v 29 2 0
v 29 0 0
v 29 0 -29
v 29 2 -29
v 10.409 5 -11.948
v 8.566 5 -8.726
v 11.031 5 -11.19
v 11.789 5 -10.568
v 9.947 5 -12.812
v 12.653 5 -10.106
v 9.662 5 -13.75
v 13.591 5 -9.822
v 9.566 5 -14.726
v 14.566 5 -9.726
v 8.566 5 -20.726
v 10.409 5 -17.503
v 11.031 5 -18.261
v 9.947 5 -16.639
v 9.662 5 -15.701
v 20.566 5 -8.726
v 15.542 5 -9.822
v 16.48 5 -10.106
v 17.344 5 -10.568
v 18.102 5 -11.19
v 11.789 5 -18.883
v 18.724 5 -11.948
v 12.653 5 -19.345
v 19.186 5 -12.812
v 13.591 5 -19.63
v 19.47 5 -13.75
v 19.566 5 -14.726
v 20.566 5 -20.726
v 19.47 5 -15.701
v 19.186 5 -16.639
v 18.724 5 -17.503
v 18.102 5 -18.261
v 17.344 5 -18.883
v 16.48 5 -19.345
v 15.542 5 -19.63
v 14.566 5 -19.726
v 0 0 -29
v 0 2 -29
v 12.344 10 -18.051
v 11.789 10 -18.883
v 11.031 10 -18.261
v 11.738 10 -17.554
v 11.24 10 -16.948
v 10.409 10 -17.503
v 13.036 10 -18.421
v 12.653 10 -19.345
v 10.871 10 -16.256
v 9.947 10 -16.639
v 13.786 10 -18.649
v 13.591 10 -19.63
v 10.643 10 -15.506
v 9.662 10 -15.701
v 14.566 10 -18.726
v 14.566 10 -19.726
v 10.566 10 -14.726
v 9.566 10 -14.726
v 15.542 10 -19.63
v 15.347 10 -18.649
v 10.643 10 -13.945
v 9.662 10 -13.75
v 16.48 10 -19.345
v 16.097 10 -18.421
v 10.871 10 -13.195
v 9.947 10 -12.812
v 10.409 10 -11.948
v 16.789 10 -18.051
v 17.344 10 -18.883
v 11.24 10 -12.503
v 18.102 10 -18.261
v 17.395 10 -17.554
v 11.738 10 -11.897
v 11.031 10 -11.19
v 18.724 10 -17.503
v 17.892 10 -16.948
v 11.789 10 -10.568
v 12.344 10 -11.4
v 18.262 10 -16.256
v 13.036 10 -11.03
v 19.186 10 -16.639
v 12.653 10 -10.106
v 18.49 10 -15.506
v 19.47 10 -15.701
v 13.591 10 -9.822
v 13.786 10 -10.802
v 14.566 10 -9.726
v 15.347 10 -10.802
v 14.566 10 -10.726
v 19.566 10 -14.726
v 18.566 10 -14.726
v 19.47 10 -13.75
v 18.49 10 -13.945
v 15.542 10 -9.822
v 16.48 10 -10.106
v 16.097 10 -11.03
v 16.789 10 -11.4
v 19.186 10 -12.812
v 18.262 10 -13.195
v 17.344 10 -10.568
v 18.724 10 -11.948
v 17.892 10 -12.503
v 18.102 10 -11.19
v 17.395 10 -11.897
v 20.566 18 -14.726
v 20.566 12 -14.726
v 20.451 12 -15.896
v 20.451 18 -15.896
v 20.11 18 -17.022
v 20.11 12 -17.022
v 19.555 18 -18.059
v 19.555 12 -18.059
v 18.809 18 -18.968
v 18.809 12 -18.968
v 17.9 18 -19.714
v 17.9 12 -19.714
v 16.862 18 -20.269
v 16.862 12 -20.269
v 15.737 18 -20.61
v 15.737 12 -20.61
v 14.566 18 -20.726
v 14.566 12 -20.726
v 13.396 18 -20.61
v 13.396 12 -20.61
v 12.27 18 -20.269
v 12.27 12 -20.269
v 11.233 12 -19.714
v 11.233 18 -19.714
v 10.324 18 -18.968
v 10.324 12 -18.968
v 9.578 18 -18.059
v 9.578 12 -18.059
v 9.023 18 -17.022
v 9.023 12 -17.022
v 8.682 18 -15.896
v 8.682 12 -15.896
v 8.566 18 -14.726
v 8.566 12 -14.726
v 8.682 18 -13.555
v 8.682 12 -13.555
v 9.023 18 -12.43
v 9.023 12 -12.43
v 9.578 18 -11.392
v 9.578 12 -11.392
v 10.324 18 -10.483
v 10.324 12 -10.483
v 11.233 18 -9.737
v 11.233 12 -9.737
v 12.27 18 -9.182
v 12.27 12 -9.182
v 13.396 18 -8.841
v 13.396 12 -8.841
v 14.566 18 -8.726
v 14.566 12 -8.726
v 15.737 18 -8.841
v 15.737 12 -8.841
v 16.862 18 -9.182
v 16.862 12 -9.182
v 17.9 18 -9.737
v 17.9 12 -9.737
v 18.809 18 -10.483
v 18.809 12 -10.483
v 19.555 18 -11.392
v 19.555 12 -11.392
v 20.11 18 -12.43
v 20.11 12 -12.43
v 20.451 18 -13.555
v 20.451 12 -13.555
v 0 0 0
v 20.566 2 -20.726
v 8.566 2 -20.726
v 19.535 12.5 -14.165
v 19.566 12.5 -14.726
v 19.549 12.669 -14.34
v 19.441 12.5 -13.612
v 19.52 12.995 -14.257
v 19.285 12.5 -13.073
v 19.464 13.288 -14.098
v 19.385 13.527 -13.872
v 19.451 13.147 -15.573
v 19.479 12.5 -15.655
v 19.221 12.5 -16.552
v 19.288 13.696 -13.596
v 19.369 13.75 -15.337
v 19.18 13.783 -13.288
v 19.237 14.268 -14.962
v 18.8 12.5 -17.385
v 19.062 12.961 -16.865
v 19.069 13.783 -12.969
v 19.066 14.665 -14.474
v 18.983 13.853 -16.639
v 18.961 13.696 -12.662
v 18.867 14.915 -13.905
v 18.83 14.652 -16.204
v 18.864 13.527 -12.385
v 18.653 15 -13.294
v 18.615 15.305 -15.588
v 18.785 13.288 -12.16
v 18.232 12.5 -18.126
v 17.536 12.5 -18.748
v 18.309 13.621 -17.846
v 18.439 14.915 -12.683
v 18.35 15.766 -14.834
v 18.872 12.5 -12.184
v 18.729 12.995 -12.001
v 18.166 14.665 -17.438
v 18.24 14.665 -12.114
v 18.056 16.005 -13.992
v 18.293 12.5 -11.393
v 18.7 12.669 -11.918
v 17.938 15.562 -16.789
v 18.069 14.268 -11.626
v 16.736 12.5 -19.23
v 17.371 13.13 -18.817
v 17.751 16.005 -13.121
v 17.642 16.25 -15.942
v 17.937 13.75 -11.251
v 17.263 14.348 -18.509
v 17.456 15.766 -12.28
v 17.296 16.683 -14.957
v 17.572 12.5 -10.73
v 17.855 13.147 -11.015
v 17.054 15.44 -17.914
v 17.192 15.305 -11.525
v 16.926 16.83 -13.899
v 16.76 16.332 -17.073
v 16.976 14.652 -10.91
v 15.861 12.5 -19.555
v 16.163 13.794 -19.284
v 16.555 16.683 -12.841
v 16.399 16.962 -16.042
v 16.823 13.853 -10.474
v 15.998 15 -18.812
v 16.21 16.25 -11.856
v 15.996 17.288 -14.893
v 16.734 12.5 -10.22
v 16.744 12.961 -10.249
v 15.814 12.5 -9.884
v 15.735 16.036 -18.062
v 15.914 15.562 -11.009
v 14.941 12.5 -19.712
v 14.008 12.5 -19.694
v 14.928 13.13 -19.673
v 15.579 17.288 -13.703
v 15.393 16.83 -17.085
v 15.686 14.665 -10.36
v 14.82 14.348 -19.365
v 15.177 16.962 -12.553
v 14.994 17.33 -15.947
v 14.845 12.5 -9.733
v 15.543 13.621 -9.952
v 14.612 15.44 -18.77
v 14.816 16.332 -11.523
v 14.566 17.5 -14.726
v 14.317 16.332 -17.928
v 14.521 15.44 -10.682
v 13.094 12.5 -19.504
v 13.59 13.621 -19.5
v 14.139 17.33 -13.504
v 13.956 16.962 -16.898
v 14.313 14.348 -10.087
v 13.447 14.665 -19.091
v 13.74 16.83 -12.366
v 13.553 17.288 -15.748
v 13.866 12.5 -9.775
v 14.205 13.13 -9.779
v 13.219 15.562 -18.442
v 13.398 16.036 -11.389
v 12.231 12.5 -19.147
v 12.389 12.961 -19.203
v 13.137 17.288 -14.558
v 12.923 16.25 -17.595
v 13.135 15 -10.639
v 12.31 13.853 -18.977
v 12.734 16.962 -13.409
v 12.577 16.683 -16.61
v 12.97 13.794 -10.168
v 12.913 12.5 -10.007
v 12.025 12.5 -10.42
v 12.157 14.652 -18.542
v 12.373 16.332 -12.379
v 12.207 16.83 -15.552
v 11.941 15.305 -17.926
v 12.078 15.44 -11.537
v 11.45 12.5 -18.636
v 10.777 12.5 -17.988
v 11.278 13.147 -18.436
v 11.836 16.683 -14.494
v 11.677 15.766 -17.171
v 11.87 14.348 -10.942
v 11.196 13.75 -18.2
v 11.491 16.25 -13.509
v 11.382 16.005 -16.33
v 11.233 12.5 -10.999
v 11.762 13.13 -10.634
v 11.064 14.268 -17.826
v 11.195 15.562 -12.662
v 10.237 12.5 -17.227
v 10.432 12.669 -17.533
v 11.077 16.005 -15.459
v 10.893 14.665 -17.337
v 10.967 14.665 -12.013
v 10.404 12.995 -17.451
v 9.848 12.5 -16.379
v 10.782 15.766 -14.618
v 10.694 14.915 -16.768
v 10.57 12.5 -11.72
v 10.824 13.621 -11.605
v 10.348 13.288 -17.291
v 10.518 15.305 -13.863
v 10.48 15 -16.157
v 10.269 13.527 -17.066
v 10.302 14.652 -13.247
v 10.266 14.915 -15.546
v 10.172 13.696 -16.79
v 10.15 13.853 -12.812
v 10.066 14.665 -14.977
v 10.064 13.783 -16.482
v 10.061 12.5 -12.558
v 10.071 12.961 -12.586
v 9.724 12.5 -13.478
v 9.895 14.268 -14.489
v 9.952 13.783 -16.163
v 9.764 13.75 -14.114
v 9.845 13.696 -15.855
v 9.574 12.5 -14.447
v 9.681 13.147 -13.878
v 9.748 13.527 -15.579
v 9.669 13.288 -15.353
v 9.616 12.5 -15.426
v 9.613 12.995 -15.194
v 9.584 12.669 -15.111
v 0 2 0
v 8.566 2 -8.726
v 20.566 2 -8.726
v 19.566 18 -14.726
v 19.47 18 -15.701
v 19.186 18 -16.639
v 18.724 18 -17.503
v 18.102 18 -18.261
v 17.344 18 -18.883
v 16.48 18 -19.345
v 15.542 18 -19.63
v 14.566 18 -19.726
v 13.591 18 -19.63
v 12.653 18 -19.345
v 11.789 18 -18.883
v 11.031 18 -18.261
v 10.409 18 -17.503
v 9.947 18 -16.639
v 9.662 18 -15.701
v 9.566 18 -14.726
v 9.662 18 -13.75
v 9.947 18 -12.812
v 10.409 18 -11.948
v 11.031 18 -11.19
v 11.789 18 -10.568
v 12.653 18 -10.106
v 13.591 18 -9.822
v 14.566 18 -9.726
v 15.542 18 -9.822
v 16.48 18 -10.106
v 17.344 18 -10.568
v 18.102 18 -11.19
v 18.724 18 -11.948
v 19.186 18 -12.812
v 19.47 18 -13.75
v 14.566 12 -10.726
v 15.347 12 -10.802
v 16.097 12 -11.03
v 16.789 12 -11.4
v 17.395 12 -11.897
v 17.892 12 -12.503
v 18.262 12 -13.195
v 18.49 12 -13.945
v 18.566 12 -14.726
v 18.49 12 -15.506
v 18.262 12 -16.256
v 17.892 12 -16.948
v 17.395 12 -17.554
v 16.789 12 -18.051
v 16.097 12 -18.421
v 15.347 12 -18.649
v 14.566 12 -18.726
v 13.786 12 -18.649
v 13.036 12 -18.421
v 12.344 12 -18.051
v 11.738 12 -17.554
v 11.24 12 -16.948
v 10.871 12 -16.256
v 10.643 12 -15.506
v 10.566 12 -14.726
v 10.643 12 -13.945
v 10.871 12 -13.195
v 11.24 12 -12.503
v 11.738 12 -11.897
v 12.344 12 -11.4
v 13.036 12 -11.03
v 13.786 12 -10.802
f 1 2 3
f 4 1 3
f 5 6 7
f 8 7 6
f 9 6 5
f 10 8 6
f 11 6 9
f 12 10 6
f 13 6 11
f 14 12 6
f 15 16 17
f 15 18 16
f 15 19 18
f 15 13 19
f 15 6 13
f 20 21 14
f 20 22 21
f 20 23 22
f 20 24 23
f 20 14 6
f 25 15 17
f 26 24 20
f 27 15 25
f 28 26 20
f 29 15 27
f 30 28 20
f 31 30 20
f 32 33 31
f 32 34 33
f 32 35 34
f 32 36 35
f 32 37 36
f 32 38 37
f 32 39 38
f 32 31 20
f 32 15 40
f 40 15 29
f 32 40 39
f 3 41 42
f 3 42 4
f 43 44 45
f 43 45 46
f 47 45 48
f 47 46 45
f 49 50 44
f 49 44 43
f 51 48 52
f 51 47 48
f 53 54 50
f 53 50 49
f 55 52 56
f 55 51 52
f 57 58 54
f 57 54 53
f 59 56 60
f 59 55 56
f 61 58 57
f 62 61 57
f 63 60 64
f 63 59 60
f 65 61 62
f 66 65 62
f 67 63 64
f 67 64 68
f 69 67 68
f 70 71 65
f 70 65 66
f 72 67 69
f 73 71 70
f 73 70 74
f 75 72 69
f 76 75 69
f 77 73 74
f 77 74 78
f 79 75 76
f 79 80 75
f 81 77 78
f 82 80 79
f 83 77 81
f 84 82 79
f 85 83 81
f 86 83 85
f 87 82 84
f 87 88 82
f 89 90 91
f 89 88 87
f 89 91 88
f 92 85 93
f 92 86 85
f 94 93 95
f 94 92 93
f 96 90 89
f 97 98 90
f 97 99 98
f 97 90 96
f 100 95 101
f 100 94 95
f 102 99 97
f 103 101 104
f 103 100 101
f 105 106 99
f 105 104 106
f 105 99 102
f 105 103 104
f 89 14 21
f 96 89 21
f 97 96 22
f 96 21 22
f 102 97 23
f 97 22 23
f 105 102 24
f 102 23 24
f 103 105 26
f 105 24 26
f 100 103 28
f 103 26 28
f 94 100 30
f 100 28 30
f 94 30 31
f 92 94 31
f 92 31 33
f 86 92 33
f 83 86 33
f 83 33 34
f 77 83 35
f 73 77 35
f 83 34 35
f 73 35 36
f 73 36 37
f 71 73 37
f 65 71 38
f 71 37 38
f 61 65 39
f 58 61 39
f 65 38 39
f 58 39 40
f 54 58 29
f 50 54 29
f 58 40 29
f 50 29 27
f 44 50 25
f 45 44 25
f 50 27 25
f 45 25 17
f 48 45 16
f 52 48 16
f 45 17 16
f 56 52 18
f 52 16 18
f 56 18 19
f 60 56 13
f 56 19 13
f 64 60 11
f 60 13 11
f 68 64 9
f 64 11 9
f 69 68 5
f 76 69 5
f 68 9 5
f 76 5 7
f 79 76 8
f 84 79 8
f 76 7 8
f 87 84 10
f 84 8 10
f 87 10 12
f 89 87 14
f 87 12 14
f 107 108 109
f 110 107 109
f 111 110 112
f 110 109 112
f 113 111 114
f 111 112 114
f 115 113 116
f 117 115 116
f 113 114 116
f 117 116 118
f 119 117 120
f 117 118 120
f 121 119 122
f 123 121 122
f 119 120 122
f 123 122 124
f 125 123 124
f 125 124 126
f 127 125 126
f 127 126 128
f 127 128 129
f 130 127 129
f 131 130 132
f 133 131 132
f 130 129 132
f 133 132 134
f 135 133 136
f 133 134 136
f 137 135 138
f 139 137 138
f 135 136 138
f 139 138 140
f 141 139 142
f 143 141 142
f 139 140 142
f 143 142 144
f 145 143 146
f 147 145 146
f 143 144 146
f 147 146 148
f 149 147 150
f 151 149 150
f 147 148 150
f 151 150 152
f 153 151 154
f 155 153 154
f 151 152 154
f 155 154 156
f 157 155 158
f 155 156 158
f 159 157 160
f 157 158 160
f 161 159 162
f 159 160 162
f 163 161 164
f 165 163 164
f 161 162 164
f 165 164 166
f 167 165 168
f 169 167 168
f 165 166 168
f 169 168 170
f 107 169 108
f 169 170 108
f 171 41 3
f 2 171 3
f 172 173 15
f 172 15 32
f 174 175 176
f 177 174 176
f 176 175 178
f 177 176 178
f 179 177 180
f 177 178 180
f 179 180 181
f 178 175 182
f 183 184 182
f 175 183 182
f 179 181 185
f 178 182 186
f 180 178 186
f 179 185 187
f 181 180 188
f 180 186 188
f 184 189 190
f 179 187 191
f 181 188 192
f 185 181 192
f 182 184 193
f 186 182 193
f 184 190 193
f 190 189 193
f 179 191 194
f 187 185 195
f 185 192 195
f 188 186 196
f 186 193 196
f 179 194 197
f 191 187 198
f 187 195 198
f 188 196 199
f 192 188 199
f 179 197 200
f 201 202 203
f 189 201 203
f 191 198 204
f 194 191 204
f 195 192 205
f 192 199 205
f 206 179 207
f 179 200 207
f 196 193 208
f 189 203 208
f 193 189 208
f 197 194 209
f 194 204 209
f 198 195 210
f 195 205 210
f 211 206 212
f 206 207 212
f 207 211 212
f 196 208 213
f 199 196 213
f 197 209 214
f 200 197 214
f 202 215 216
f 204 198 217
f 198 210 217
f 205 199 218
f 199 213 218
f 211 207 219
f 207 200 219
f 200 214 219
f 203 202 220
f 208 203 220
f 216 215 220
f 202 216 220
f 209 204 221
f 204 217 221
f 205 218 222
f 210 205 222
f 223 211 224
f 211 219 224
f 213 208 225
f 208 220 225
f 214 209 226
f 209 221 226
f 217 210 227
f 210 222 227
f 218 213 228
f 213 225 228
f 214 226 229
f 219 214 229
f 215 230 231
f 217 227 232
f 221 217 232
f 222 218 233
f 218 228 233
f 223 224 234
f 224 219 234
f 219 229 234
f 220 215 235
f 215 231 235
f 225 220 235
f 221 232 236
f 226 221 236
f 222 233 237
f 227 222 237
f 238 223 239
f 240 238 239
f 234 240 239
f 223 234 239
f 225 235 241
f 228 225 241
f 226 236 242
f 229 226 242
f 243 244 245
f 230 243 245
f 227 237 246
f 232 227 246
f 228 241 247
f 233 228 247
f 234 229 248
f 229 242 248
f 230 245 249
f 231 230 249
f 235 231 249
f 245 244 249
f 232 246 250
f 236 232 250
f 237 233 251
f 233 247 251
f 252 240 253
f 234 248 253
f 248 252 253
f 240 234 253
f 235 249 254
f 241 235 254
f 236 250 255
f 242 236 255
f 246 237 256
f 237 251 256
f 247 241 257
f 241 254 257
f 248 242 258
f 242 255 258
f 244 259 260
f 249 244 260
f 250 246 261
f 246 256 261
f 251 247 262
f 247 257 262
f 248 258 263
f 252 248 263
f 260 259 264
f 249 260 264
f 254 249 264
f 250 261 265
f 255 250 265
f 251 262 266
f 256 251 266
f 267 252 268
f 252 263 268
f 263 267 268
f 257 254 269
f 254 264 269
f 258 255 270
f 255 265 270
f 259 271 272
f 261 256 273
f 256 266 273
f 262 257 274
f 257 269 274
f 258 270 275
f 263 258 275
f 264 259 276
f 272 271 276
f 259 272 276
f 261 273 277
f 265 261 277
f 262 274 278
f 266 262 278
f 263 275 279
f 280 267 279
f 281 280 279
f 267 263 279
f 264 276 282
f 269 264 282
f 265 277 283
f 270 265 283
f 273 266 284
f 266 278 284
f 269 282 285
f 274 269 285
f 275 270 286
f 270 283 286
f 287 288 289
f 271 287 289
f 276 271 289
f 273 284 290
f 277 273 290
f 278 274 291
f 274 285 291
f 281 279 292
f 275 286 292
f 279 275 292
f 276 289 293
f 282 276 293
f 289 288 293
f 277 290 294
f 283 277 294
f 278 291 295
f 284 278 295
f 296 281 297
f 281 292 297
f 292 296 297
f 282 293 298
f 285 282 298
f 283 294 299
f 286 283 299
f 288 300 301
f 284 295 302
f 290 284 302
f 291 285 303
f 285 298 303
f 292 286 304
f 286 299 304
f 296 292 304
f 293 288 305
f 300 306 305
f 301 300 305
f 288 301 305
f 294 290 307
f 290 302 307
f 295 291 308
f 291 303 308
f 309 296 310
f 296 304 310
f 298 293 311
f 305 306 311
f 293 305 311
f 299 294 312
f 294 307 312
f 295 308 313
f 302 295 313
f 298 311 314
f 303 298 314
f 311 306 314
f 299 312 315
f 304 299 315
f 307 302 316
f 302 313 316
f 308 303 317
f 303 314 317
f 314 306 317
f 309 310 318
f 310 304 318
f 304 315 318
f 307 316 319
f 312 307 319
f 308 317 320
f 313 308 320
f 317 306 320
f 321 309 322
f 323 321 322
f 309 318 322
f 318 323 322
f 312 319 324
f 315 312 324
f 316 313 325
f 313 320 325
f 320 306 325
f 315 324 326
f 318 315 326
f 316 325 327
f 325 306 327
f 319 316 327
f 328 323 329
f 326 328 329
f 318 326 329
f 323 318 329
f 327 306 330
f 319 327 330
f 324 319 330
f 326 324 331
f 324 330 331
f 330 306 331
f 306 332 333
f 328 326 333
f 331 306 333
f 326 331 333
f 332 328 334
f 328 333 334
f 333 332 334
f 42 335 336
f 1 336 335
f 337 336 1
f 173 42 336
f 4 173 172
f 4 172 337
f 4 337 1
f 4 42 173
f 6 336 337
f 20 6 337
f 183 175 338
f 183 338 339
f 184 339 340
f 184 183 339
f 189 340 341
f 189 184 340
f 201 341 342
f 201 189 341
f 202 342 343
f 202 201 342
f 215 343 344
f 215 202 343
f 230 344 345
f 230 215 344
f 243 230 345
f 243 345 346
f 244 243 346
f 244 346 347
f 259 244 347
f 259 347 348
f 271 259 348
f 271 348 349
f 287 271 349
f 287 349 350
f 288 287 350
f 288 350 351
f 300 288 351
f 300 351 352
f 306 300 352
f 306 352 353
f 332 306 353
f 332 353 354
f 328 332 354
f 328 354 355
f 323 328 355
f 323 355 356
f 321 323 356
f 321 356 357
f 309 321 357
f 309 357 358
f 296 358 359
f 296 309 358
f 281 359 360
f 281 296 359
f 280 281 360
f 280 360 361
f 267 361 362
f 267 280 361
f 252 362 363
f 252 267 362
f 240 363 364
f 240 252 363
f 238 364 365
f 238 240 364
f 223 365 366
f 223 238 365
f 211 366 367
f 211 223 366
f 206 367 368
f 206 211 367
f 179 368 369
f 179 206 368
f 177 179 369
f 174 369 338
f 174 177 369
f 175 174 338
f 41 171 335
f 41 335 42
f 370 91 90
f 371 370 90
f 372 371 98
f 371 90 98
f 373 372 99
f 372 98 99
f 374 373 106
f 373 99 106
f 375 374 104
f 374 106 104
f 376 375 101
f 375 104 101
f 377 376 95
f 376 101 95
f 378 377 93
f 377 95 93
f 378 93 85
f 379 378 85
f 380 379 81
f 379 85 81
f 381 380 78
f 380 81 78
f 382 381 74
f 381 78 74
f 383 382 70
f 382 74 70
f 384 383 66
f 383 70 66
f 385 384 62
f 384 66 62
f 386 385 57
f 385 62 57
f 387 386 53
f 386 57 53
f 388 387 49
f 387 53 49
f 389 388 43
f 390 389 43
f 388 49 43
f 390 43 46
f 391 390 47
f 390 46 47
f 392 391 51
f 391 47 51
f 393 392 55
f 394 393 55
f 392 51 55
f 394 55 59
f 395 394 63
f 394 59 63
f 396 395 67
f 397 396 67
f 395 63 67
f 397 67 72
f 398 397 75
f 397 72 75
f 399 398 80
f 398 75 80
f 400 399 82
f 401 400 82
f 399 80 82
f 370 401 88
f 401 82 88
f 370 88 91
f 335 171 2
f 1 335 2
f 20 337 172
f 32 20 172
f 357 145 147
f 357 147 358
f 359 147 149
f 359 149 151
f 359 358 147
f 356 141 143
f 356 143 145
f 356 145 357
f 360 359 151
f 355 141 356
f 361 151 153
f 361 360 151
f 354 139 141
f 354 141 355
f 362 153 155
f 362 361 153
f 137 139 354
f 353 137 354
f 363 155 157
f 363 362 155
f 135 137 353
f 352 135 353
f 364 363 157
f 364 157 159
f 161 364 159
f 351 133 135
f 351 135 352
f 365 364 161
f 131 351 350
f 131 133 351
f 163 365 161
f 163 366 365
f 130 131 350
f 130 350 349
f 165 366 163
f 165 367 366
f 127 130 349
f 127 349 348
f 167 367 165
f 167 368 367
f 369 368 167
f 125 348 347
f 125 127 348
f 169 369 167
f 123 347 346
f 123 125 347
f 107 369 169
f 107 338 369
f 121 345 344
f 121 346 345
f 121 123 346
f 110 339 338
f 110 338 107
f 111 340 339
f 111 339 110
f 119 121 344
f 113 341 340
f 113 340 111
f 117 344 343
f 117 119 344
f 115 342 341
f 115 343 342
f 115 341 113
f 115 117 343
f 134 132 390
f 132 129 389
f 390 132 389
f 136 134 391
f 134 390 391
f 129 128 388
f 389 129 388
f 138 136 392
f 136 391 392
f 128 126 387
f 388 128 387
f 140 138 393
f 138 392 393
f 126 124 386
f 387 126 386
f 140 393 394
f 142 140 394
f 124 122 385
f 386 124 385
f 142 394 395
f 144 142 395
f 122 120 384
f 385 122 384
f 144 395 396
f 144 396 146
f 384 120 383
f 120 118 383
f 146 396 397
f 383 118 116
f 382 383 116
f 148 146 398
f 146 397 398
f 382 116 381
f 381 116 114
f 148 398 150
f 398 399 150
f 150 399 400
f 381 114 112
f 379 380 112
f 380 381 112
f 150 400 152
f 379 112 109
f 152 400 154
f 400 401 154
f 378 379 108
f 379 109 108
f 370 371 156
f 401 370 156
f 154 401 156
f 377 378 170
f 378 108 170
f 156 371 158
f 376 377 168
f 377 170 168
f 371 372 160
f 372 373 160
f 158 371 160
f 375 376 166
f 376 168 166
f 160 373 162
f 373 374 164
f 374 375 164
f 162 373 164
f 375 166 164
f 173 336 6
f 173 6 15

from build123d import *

# Parameters (mm, degrees)
SKETCH1_W           = 29
SKETCH1_H           = 29
BOSS_EXTRUDE1_DEPTH = 2
SKETCH2_W           = 12
SKETCH2_H           = 12
BOSS_EXTRUDE2_DEPTH = 3
SKETCH5_R           = 5
BOSS_EXTRUDE3_DEPTH = 5
SKETCH6_R           = 4
BOSS_EXTRUDE4_DEPTH = 2
SKETCH8_R           = 6
SKETCH8_R_2         = 5
EXTRUDE_THIN2_DEPTH = 6
SKETCH9_R           = 5
BOSS_EXTRUDE5_DEPTH = 0.5
REVOLVE1_ANGLE      = 180


with BuildPart() as part:
    # Sketch1 → Boss-Extrude1 (new body)
    with BuildSketch(Plane(origin=(0, 0, 0), x_dir=(1, 0, 0), z_dir=(0, 1, 0))):
        with Locations((14.5, 14.5)):
            Rectangle(SKETCH1_W, SKETCH1_H)
    extrude(amount=BOSS_EXTRUDE1_DEPTH)

    # Sketch2 → Boss-Extrude2 (add)
    with BuildSketch(Plane(origin=(0, 2, 0), x_dir=(1, 0, 0), z_dir=(0, 1, 0))):
        with Locations((14.566374873, 14.72560783)):
            Rectangle(SKETCH2_W, SKETCH2_H)
    extrude(amount=BOSS_EXTRUDE2_DEPTH)

    # Sketch5 → Boss-Extrude3 (add)
    with BuildSketch(Plane(origin=(0, 5, 0), x_dir=(1, 0, 0), z_dir=(0, 1, 0))):
        with Locations((14.566374873, 14.72560783)):
            Circle(SKETCH5_R)
    extrude(amount=BOSS_EXTRUDE3_DEPTH)

    # Sketch6 → Boss-Extrude4 (add)
    with BuildSketch(Plane(origin=(0, 10, 0), x_dir=(1, 0, 0), z_dir=(0, 1, 0))):
        with Locations((14.566374873, 14.72560783)):
            Circle(SKETCH6_R)
    extrude(amount=BOSS_EXTRUDE4_DEPTH)



with BuildPart() as body_2:
    # Sketch8 → Extrude-Thin2 (new body)
    with BuildSketch(Plane(origin=(0, 12, 0), x_dir=(1, 0, 0), z_dir=(0, 1, 0))):
        with Locations((14.566374873, 14.72560783)):
            Circle(SKETCH8_R)
        with Locations((14.566374873, 14.72560783)):
            Circle(SKETCH8_R_2, mode=Mode.SUBTRACT)
    extrude(amount=EXTRUDE_THIN2_DEPTH)


with BuildPart() as part_1:
    add(part.part)

    add(body_2.part)  # Boss-Extrude5 merges body 2
    # Sketch9 → Boss-Extrude5 (add)
    with BuildSketch(Plane(origin=(0, 12, 0), x_dir=(1, 0, 0), z_dir=(0, 1, 0))):
        with Locations((14.566374873, 14.72560783)):
            Circle(SKETCH9_R)
    extrude(amount=BOSS_EXTRUDE5_DEPTH)

    # Sketch13 → Revolve1 (revolve)
    with BuildSketch(Plane(origin=(0, 12.5, 0), x_dir=(1, 0, 0), z_dir=(0, 1, 0))):
        with BuildLine():
            Line((9.847526331, 16.378625808), (19.285223415, 13.072589852))
            ThreePointArc((19.285223415, 13.072589852), (16.219392851, 19.444456372), (9.847526331, 16.378625808))
        make_face()
    revolve(axis=Axis((9.847526331, 12.5, -16.378625808), (0.9437697084535585, 0, 0.33060359557253066)), revolution_arc=REVOLVE1_ANGLE)


solid = part_1.part
